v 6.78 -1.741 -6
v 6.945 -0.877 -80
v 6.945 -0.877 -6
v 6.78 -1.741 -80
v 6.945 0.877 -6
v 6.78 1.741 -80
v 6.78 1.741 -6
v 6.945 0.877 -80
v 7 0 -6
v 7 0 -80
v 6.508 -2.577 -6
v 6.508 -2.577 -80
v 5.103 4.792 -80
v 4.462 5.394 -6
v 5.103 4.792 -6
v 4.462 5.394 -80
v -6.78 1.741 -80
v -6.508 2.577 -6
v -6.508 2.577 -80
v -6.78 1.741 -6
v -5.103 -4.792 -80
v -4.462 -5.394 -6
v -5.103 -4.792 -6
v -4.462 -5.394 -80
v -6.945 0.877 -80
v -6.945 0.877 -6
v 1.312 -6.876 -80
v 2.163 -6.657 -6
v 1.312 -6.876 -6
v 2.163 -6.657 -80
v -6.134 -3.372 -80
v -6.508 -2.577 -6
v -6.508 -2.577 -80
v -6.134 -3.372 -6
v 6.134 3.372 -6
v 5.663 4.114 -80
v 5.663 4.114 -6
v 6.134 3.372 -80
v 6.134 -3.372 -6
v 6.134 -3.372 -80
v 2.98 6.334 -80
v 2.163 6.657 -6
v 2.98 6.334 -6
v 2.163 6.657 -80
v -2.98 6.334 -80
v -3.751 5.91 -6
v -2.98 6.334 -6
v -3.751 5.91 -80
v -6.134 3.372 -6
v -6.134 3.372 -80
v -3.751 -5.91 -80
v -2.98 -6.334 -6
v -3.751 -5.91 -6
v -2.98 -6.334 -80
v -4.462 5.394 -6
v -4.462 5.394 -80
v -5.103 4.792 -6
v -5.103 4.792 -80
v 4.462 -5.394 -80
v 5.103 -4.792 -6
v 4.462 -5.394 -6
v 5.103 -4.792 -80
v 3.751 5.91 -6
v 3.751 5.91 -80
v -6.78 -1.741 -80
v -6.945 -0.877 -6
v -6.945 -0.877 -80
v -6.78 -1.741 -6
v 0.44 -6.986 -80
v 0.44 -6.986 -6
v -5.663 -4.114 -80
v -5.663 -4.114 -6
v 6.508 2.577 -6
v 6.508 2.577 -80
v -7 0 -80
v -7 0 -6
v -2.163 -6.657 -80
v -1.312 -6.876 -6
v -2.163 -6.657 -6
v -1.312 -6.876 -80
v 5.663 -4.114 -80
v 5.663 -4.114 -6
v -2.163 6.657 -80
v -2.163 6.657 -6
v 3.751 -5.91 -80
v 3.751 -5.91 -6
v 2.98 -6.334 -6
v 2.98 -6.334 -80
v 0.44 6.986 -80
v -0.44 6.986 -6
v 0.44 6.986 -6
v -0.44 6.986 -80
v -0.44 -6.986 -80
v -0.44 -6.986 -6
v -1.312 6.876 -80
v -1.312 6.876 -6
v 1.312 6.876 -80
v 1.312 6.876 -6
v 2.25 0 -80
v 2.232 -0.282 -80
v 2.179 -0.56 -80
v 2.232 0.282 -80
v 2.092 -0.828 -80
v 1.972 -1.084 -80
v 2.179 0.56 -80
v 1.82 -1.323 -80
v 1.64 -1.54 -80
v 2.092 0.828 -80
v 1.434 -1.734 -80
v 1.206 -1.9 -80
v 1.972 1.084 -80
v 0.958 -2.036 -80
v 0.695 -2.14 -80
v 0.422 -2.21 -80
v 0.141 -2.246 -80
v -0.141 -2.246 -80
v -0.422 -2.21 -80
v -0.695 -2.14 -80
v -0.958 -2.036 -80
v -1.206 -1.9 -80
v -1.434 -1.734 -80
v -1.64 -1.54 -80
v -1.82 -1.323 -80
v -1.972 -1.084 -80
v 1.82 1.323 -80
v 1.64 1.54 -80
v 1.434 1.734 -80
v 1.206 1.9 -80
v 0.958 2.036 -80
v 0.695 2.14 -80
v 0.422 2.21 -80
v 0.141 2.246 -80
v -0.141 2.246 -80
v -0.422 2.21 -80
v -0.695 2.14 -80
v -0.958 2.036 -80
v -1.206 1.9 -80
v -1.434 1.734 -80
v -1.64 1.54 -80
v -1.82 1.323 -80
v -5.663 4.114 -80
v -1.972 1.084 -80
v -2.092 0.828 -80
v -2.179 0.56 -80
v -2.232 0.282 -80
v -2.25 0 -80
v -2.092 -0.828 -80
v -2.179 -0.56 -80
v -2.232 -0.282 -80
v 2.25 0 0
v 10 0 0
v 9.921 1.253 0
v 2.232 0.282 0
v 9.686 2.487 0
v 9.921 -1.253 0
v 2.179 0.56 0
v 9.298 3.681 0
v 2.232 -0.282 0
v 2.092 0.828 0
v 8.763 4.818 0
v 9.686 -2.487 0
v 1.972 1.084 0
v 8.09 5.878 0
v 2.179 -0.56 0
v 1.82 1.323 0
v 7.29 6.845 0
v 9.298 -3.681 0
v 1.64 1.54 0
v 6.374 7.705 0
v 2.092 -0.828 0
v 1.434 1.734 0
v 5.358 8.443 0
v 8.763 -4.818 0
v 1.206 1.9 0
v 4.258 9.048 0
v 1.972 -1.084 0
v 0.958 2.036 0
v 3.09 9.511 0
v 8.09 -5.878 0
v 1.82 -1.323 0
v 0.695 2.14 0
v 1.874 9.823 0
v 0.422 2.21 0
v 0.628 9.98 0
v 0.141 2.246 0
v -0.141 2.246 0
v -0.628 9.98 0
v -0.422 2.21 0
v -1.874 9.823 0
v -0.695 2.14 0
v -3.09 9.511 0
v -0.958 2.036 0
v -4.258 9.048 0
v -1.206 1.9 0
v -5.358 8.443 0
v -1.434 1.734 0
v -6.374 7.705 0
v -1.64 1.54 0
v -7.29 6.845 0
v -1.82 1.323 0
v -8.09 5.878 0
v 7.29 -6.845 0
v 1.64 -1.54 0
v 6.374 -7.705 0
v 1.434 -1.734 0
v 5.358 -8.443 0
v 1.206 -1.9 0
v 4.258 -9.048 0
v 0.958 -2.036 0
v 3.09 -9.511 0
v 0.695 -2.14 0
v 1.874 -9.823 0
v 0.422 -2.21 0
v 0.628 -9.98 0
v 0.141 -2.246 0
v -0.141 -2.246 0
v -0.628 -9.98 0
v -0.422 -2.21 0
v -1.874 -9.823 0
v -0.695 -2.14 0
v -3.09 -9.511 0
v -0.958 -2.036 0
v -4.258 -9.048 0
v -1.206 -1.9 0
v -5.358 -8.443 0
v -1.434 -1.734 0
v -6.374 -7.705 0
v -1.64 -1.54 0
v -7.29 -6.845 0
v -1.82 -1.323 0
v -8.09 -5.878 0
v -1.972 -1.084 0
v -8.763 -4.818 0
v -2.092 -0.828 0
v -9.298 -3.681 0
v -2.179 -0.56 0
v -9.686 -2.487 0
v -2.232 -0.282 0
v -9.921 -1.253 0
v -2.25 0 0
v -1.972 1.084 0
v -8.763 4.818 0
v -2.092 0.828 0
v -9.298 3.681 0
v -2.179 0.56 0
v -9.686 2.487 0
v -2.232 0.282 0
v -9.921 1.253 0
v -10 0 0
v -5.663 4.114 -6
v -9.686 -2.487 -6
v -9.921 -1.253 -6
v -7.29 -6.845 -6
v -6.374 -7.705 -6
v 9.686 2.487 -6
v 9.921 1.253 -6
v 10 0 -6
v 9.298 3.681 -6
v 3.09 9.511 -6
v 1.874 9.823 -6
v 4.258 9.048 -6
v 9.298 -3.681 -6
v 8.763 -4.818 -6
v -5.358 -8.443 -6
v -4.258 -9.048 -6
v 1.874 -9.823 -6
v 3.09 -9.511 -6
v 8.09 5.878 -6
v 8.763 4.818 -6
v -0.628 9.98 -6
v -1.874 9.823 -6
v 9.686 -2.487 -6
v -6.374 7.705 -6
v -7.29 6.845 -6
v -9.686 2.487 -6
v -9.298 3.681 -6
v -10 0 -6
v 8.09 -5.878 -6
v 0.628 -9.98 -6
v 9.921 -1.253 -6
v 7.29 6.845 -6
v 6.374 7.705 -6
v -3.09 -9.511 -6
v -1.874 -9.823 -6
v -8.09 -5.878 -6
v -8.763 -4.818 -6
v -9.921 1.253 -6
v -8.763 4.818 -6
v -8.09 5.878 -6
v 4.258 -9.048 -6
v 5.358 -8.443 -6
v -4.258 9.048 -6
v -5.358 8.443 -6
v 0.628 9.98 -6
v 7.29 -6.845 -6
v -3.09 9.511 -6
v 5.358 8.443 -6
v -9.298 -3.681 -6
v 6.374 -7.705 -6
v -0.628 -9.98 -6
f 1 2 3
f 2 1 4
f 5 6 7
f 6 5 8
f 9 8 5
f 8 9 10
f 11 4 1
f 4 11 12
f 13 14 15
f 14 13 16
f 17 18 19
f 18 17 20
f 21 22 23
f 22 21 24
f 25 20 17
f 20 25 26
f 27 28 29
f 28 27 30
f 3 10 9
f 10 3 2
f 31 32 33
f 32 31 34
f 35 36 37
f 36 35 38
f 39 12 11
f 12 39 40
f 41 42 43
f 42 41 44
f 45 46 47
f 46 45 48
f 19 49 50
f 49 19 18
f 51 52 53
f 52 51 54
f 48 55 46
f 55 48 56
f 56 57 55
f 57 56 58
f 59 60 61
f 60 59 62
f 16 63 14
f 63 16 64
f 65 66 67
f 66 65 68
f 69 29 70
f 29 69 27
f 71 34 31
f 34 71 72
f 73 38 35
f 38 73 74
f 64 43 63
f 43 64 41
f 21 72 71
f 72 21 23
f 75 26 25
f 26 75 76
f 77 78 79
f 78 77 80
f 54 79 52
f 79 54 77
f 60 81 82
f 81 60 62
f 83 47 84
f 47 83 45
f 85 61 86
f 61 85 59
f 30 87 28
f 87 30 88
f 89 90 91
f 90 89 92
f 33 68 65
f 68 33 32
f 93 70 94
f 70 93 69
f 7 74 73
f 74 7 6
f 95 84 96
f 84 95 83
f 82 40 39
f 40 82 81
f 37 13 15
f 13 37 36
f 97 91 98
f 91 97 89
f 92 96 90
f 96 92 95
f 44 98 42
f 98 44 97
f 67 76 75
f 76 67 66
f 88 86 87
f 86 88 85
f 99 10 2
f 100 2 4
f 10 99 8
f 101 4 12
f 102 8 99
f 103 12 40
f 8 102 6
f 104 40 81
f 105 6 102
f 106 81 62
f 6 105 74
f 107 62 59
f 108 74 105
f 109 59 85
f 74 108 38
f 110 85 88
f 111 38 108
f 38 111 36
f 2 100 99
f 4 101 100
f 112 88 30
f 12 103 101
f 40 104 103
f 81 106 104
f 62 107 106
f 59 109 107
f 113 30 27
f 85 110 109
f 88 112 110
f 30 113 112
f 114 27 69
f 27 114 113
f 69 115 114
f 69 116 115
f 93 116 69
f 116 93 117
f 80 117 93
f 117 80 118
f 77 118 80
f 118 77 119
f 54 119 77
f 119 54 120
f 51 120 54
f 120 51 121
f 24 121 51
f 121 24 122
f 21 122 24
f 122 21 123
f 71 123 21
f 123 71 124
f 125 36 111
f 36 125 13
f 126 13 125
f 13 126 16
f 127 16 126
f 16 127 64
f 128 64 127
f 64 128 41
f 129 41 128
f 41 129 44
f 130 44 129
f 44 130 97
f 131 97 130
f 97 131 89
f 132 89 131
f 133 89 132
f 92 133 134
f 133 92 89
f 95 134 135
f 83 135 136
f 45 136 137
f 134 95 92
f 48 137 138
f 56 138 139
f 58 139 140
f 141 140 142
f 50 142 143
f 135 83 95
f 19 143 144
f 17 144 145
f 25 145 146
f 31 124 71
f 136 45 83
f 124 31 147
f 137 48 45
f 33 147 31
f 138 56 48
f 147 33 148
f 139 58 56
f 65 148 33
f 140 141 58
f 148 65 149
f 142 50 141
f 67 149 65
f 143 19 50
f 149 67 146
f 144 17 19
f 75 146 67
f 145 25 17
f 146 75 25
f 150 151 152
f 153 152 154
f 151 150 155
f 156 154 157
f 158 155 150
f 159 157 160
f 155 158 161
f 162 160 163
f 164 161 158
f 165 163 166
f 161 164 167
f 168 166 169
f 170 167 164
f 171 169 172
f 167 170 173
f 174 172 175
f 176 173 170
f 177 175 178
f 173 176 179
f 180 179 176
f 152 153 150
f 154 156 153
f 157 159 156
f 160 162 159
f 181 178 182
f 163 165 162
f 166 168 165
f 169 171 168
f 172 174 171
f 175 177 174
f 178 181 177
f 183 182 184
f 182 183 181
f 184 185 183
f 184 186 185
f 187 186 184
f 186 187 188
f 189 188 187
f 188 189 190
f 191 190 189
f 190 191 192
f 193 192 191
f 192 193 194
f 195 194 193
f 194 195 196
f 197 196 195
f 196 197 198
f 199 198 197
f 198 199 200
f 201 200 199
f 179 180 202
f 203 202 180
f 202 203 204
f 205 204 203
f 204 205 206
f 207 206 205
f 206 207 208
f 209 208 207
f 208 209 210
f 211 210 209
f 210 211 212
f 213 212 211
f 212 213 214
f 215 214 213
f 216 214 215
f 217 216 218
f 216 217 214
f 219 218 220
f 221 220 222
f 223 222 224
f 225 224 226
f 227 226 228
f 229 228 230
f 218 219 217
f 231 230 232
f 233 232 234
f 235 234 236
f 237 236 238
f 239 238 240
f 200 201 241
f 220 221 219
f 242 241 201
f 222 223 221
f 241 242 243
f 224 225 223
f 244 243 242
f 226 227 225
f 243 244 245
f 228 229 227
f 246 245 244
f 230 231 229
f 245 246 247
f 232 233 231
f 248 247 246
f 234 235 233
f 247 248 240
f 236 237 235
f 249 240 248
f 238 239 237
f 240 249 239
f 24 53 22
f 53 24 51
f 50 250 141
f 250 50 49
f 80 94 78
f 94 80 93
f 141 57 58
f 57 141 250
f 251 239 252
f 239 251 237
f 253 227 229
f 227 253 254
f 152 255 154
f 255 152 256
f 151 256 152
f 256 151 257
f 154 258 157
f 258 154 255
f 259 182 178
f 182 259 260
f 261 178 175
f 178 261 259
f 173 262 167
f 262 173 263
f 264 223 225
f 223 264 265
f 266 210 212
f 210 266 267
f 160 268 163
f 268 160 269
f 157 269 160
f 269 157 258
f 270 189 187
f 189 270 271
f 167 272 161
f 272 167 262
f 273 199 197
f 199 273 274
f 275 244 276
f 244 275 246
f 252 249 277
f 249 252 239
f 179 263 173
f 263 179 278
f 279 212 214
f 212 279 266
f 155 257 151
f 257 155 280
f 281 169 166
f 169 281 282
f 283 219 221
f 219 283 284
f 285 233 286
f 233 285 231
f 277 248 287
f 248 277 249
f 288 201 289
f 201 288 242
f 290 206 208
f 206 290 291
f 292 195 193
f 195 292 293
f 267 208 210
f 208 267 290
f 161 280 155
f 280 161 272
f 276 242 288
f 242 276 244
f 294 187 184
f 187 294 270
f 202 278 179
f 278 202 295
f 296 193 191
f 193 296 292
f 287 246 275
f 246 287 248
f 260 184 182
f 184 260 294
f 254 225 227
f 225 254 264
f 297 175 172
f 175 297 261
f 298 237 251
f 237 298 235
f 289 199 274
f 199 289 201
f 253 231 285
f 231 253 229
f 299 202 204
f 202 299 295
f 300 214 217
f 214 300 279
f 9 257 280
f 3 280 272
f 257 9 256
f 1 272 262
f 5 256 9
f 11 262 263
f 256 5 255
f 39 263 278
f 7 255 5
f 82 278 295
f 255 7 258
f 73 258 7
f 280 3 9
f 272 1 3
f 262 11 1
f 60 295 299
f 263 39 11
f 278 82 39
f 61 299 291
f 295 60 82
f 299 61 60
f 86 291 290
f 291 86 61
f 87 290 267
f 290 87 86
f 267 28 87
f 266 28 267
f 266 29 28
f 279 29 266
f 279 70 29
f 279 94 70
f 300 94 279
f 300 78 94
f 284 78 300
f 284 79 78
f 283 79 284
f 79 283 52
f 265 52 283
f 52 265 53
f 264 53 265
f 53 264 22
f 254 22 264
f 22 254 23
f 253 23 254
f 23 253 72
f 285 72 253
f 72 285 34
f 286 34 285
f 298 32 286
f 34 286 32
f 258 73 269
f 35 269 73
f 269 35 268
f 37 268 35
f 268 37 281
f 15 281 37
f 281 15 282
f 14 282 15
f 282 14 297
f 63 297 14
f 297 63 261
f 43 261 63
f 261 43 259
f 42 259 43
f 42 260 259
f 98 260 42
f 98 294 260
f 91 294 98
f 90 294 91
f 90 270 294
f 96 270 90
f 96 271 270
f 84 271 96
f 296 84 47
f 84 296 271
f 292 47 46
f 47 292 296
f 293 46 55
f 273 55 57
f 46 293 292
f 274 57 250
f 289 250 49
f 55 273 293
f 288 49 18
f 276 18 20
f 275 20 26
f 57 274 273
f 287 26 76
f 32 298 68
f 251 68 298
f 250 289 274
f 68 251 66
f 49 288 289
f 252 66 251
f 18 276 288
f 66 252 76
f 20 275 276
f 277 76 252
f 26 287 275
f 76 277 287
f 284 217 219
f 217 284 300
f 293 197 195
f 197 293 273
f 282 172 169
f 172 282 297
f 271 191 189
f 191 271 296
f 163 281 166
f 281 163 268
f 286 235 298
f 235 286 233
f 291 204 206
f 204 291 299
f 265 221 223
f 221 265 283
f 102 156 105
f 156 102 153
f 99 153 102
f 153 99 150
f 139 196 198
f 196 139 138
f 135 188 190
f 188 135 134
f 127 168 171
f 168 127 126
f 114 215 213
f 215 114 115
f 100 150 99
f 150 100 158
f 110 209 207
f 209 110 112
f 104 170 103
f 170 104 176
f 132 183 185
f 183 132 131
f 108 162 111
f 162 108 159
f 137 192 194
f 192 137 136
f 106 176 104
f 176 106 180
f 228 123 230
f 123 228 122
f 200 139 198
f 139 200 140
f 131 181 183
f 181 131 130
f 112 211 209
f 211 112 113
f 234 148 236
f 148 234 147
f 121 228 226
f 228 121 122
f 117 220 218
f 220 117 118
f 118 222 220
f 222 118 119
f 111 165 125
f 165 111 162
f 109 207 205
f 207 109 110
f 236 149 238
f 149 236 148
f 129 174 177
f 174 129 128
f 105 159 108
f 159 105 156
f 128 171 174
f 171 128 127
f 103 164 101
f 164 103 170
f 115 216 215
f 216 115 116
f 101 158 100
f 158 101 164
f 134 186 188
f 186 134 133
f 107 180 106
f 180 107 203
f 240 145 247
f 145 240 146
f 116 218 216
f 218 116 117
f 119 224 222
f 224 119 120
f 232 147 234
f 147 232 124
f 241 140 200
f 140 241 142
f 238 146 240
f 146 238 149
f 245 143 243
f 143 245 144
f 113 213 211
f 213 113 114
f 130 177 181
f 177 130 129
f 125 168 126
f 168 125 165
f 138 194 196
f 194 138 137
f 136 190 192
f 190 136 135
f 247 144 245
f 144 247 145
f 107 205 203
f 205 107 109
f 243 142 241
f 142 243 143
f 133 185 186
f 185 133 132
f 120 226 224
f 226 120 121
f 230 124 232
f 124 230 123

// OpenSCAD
$fn = 50;


difference() {
	union() {
		translate(v = [0, 0, -80.0000000000]) {
			cylinder(h = 80, r = 7.0000000000);
		}
		translate(v = [0, 0, -6.0000000000]) {
			cylinder(h = 6, r = 10.0000000000);
		}
	}
	union() {
		#translate(v = [0, 0, -80]) {
			cylinder(h = 80, r = 2.2500000000);
		}
	}
}
